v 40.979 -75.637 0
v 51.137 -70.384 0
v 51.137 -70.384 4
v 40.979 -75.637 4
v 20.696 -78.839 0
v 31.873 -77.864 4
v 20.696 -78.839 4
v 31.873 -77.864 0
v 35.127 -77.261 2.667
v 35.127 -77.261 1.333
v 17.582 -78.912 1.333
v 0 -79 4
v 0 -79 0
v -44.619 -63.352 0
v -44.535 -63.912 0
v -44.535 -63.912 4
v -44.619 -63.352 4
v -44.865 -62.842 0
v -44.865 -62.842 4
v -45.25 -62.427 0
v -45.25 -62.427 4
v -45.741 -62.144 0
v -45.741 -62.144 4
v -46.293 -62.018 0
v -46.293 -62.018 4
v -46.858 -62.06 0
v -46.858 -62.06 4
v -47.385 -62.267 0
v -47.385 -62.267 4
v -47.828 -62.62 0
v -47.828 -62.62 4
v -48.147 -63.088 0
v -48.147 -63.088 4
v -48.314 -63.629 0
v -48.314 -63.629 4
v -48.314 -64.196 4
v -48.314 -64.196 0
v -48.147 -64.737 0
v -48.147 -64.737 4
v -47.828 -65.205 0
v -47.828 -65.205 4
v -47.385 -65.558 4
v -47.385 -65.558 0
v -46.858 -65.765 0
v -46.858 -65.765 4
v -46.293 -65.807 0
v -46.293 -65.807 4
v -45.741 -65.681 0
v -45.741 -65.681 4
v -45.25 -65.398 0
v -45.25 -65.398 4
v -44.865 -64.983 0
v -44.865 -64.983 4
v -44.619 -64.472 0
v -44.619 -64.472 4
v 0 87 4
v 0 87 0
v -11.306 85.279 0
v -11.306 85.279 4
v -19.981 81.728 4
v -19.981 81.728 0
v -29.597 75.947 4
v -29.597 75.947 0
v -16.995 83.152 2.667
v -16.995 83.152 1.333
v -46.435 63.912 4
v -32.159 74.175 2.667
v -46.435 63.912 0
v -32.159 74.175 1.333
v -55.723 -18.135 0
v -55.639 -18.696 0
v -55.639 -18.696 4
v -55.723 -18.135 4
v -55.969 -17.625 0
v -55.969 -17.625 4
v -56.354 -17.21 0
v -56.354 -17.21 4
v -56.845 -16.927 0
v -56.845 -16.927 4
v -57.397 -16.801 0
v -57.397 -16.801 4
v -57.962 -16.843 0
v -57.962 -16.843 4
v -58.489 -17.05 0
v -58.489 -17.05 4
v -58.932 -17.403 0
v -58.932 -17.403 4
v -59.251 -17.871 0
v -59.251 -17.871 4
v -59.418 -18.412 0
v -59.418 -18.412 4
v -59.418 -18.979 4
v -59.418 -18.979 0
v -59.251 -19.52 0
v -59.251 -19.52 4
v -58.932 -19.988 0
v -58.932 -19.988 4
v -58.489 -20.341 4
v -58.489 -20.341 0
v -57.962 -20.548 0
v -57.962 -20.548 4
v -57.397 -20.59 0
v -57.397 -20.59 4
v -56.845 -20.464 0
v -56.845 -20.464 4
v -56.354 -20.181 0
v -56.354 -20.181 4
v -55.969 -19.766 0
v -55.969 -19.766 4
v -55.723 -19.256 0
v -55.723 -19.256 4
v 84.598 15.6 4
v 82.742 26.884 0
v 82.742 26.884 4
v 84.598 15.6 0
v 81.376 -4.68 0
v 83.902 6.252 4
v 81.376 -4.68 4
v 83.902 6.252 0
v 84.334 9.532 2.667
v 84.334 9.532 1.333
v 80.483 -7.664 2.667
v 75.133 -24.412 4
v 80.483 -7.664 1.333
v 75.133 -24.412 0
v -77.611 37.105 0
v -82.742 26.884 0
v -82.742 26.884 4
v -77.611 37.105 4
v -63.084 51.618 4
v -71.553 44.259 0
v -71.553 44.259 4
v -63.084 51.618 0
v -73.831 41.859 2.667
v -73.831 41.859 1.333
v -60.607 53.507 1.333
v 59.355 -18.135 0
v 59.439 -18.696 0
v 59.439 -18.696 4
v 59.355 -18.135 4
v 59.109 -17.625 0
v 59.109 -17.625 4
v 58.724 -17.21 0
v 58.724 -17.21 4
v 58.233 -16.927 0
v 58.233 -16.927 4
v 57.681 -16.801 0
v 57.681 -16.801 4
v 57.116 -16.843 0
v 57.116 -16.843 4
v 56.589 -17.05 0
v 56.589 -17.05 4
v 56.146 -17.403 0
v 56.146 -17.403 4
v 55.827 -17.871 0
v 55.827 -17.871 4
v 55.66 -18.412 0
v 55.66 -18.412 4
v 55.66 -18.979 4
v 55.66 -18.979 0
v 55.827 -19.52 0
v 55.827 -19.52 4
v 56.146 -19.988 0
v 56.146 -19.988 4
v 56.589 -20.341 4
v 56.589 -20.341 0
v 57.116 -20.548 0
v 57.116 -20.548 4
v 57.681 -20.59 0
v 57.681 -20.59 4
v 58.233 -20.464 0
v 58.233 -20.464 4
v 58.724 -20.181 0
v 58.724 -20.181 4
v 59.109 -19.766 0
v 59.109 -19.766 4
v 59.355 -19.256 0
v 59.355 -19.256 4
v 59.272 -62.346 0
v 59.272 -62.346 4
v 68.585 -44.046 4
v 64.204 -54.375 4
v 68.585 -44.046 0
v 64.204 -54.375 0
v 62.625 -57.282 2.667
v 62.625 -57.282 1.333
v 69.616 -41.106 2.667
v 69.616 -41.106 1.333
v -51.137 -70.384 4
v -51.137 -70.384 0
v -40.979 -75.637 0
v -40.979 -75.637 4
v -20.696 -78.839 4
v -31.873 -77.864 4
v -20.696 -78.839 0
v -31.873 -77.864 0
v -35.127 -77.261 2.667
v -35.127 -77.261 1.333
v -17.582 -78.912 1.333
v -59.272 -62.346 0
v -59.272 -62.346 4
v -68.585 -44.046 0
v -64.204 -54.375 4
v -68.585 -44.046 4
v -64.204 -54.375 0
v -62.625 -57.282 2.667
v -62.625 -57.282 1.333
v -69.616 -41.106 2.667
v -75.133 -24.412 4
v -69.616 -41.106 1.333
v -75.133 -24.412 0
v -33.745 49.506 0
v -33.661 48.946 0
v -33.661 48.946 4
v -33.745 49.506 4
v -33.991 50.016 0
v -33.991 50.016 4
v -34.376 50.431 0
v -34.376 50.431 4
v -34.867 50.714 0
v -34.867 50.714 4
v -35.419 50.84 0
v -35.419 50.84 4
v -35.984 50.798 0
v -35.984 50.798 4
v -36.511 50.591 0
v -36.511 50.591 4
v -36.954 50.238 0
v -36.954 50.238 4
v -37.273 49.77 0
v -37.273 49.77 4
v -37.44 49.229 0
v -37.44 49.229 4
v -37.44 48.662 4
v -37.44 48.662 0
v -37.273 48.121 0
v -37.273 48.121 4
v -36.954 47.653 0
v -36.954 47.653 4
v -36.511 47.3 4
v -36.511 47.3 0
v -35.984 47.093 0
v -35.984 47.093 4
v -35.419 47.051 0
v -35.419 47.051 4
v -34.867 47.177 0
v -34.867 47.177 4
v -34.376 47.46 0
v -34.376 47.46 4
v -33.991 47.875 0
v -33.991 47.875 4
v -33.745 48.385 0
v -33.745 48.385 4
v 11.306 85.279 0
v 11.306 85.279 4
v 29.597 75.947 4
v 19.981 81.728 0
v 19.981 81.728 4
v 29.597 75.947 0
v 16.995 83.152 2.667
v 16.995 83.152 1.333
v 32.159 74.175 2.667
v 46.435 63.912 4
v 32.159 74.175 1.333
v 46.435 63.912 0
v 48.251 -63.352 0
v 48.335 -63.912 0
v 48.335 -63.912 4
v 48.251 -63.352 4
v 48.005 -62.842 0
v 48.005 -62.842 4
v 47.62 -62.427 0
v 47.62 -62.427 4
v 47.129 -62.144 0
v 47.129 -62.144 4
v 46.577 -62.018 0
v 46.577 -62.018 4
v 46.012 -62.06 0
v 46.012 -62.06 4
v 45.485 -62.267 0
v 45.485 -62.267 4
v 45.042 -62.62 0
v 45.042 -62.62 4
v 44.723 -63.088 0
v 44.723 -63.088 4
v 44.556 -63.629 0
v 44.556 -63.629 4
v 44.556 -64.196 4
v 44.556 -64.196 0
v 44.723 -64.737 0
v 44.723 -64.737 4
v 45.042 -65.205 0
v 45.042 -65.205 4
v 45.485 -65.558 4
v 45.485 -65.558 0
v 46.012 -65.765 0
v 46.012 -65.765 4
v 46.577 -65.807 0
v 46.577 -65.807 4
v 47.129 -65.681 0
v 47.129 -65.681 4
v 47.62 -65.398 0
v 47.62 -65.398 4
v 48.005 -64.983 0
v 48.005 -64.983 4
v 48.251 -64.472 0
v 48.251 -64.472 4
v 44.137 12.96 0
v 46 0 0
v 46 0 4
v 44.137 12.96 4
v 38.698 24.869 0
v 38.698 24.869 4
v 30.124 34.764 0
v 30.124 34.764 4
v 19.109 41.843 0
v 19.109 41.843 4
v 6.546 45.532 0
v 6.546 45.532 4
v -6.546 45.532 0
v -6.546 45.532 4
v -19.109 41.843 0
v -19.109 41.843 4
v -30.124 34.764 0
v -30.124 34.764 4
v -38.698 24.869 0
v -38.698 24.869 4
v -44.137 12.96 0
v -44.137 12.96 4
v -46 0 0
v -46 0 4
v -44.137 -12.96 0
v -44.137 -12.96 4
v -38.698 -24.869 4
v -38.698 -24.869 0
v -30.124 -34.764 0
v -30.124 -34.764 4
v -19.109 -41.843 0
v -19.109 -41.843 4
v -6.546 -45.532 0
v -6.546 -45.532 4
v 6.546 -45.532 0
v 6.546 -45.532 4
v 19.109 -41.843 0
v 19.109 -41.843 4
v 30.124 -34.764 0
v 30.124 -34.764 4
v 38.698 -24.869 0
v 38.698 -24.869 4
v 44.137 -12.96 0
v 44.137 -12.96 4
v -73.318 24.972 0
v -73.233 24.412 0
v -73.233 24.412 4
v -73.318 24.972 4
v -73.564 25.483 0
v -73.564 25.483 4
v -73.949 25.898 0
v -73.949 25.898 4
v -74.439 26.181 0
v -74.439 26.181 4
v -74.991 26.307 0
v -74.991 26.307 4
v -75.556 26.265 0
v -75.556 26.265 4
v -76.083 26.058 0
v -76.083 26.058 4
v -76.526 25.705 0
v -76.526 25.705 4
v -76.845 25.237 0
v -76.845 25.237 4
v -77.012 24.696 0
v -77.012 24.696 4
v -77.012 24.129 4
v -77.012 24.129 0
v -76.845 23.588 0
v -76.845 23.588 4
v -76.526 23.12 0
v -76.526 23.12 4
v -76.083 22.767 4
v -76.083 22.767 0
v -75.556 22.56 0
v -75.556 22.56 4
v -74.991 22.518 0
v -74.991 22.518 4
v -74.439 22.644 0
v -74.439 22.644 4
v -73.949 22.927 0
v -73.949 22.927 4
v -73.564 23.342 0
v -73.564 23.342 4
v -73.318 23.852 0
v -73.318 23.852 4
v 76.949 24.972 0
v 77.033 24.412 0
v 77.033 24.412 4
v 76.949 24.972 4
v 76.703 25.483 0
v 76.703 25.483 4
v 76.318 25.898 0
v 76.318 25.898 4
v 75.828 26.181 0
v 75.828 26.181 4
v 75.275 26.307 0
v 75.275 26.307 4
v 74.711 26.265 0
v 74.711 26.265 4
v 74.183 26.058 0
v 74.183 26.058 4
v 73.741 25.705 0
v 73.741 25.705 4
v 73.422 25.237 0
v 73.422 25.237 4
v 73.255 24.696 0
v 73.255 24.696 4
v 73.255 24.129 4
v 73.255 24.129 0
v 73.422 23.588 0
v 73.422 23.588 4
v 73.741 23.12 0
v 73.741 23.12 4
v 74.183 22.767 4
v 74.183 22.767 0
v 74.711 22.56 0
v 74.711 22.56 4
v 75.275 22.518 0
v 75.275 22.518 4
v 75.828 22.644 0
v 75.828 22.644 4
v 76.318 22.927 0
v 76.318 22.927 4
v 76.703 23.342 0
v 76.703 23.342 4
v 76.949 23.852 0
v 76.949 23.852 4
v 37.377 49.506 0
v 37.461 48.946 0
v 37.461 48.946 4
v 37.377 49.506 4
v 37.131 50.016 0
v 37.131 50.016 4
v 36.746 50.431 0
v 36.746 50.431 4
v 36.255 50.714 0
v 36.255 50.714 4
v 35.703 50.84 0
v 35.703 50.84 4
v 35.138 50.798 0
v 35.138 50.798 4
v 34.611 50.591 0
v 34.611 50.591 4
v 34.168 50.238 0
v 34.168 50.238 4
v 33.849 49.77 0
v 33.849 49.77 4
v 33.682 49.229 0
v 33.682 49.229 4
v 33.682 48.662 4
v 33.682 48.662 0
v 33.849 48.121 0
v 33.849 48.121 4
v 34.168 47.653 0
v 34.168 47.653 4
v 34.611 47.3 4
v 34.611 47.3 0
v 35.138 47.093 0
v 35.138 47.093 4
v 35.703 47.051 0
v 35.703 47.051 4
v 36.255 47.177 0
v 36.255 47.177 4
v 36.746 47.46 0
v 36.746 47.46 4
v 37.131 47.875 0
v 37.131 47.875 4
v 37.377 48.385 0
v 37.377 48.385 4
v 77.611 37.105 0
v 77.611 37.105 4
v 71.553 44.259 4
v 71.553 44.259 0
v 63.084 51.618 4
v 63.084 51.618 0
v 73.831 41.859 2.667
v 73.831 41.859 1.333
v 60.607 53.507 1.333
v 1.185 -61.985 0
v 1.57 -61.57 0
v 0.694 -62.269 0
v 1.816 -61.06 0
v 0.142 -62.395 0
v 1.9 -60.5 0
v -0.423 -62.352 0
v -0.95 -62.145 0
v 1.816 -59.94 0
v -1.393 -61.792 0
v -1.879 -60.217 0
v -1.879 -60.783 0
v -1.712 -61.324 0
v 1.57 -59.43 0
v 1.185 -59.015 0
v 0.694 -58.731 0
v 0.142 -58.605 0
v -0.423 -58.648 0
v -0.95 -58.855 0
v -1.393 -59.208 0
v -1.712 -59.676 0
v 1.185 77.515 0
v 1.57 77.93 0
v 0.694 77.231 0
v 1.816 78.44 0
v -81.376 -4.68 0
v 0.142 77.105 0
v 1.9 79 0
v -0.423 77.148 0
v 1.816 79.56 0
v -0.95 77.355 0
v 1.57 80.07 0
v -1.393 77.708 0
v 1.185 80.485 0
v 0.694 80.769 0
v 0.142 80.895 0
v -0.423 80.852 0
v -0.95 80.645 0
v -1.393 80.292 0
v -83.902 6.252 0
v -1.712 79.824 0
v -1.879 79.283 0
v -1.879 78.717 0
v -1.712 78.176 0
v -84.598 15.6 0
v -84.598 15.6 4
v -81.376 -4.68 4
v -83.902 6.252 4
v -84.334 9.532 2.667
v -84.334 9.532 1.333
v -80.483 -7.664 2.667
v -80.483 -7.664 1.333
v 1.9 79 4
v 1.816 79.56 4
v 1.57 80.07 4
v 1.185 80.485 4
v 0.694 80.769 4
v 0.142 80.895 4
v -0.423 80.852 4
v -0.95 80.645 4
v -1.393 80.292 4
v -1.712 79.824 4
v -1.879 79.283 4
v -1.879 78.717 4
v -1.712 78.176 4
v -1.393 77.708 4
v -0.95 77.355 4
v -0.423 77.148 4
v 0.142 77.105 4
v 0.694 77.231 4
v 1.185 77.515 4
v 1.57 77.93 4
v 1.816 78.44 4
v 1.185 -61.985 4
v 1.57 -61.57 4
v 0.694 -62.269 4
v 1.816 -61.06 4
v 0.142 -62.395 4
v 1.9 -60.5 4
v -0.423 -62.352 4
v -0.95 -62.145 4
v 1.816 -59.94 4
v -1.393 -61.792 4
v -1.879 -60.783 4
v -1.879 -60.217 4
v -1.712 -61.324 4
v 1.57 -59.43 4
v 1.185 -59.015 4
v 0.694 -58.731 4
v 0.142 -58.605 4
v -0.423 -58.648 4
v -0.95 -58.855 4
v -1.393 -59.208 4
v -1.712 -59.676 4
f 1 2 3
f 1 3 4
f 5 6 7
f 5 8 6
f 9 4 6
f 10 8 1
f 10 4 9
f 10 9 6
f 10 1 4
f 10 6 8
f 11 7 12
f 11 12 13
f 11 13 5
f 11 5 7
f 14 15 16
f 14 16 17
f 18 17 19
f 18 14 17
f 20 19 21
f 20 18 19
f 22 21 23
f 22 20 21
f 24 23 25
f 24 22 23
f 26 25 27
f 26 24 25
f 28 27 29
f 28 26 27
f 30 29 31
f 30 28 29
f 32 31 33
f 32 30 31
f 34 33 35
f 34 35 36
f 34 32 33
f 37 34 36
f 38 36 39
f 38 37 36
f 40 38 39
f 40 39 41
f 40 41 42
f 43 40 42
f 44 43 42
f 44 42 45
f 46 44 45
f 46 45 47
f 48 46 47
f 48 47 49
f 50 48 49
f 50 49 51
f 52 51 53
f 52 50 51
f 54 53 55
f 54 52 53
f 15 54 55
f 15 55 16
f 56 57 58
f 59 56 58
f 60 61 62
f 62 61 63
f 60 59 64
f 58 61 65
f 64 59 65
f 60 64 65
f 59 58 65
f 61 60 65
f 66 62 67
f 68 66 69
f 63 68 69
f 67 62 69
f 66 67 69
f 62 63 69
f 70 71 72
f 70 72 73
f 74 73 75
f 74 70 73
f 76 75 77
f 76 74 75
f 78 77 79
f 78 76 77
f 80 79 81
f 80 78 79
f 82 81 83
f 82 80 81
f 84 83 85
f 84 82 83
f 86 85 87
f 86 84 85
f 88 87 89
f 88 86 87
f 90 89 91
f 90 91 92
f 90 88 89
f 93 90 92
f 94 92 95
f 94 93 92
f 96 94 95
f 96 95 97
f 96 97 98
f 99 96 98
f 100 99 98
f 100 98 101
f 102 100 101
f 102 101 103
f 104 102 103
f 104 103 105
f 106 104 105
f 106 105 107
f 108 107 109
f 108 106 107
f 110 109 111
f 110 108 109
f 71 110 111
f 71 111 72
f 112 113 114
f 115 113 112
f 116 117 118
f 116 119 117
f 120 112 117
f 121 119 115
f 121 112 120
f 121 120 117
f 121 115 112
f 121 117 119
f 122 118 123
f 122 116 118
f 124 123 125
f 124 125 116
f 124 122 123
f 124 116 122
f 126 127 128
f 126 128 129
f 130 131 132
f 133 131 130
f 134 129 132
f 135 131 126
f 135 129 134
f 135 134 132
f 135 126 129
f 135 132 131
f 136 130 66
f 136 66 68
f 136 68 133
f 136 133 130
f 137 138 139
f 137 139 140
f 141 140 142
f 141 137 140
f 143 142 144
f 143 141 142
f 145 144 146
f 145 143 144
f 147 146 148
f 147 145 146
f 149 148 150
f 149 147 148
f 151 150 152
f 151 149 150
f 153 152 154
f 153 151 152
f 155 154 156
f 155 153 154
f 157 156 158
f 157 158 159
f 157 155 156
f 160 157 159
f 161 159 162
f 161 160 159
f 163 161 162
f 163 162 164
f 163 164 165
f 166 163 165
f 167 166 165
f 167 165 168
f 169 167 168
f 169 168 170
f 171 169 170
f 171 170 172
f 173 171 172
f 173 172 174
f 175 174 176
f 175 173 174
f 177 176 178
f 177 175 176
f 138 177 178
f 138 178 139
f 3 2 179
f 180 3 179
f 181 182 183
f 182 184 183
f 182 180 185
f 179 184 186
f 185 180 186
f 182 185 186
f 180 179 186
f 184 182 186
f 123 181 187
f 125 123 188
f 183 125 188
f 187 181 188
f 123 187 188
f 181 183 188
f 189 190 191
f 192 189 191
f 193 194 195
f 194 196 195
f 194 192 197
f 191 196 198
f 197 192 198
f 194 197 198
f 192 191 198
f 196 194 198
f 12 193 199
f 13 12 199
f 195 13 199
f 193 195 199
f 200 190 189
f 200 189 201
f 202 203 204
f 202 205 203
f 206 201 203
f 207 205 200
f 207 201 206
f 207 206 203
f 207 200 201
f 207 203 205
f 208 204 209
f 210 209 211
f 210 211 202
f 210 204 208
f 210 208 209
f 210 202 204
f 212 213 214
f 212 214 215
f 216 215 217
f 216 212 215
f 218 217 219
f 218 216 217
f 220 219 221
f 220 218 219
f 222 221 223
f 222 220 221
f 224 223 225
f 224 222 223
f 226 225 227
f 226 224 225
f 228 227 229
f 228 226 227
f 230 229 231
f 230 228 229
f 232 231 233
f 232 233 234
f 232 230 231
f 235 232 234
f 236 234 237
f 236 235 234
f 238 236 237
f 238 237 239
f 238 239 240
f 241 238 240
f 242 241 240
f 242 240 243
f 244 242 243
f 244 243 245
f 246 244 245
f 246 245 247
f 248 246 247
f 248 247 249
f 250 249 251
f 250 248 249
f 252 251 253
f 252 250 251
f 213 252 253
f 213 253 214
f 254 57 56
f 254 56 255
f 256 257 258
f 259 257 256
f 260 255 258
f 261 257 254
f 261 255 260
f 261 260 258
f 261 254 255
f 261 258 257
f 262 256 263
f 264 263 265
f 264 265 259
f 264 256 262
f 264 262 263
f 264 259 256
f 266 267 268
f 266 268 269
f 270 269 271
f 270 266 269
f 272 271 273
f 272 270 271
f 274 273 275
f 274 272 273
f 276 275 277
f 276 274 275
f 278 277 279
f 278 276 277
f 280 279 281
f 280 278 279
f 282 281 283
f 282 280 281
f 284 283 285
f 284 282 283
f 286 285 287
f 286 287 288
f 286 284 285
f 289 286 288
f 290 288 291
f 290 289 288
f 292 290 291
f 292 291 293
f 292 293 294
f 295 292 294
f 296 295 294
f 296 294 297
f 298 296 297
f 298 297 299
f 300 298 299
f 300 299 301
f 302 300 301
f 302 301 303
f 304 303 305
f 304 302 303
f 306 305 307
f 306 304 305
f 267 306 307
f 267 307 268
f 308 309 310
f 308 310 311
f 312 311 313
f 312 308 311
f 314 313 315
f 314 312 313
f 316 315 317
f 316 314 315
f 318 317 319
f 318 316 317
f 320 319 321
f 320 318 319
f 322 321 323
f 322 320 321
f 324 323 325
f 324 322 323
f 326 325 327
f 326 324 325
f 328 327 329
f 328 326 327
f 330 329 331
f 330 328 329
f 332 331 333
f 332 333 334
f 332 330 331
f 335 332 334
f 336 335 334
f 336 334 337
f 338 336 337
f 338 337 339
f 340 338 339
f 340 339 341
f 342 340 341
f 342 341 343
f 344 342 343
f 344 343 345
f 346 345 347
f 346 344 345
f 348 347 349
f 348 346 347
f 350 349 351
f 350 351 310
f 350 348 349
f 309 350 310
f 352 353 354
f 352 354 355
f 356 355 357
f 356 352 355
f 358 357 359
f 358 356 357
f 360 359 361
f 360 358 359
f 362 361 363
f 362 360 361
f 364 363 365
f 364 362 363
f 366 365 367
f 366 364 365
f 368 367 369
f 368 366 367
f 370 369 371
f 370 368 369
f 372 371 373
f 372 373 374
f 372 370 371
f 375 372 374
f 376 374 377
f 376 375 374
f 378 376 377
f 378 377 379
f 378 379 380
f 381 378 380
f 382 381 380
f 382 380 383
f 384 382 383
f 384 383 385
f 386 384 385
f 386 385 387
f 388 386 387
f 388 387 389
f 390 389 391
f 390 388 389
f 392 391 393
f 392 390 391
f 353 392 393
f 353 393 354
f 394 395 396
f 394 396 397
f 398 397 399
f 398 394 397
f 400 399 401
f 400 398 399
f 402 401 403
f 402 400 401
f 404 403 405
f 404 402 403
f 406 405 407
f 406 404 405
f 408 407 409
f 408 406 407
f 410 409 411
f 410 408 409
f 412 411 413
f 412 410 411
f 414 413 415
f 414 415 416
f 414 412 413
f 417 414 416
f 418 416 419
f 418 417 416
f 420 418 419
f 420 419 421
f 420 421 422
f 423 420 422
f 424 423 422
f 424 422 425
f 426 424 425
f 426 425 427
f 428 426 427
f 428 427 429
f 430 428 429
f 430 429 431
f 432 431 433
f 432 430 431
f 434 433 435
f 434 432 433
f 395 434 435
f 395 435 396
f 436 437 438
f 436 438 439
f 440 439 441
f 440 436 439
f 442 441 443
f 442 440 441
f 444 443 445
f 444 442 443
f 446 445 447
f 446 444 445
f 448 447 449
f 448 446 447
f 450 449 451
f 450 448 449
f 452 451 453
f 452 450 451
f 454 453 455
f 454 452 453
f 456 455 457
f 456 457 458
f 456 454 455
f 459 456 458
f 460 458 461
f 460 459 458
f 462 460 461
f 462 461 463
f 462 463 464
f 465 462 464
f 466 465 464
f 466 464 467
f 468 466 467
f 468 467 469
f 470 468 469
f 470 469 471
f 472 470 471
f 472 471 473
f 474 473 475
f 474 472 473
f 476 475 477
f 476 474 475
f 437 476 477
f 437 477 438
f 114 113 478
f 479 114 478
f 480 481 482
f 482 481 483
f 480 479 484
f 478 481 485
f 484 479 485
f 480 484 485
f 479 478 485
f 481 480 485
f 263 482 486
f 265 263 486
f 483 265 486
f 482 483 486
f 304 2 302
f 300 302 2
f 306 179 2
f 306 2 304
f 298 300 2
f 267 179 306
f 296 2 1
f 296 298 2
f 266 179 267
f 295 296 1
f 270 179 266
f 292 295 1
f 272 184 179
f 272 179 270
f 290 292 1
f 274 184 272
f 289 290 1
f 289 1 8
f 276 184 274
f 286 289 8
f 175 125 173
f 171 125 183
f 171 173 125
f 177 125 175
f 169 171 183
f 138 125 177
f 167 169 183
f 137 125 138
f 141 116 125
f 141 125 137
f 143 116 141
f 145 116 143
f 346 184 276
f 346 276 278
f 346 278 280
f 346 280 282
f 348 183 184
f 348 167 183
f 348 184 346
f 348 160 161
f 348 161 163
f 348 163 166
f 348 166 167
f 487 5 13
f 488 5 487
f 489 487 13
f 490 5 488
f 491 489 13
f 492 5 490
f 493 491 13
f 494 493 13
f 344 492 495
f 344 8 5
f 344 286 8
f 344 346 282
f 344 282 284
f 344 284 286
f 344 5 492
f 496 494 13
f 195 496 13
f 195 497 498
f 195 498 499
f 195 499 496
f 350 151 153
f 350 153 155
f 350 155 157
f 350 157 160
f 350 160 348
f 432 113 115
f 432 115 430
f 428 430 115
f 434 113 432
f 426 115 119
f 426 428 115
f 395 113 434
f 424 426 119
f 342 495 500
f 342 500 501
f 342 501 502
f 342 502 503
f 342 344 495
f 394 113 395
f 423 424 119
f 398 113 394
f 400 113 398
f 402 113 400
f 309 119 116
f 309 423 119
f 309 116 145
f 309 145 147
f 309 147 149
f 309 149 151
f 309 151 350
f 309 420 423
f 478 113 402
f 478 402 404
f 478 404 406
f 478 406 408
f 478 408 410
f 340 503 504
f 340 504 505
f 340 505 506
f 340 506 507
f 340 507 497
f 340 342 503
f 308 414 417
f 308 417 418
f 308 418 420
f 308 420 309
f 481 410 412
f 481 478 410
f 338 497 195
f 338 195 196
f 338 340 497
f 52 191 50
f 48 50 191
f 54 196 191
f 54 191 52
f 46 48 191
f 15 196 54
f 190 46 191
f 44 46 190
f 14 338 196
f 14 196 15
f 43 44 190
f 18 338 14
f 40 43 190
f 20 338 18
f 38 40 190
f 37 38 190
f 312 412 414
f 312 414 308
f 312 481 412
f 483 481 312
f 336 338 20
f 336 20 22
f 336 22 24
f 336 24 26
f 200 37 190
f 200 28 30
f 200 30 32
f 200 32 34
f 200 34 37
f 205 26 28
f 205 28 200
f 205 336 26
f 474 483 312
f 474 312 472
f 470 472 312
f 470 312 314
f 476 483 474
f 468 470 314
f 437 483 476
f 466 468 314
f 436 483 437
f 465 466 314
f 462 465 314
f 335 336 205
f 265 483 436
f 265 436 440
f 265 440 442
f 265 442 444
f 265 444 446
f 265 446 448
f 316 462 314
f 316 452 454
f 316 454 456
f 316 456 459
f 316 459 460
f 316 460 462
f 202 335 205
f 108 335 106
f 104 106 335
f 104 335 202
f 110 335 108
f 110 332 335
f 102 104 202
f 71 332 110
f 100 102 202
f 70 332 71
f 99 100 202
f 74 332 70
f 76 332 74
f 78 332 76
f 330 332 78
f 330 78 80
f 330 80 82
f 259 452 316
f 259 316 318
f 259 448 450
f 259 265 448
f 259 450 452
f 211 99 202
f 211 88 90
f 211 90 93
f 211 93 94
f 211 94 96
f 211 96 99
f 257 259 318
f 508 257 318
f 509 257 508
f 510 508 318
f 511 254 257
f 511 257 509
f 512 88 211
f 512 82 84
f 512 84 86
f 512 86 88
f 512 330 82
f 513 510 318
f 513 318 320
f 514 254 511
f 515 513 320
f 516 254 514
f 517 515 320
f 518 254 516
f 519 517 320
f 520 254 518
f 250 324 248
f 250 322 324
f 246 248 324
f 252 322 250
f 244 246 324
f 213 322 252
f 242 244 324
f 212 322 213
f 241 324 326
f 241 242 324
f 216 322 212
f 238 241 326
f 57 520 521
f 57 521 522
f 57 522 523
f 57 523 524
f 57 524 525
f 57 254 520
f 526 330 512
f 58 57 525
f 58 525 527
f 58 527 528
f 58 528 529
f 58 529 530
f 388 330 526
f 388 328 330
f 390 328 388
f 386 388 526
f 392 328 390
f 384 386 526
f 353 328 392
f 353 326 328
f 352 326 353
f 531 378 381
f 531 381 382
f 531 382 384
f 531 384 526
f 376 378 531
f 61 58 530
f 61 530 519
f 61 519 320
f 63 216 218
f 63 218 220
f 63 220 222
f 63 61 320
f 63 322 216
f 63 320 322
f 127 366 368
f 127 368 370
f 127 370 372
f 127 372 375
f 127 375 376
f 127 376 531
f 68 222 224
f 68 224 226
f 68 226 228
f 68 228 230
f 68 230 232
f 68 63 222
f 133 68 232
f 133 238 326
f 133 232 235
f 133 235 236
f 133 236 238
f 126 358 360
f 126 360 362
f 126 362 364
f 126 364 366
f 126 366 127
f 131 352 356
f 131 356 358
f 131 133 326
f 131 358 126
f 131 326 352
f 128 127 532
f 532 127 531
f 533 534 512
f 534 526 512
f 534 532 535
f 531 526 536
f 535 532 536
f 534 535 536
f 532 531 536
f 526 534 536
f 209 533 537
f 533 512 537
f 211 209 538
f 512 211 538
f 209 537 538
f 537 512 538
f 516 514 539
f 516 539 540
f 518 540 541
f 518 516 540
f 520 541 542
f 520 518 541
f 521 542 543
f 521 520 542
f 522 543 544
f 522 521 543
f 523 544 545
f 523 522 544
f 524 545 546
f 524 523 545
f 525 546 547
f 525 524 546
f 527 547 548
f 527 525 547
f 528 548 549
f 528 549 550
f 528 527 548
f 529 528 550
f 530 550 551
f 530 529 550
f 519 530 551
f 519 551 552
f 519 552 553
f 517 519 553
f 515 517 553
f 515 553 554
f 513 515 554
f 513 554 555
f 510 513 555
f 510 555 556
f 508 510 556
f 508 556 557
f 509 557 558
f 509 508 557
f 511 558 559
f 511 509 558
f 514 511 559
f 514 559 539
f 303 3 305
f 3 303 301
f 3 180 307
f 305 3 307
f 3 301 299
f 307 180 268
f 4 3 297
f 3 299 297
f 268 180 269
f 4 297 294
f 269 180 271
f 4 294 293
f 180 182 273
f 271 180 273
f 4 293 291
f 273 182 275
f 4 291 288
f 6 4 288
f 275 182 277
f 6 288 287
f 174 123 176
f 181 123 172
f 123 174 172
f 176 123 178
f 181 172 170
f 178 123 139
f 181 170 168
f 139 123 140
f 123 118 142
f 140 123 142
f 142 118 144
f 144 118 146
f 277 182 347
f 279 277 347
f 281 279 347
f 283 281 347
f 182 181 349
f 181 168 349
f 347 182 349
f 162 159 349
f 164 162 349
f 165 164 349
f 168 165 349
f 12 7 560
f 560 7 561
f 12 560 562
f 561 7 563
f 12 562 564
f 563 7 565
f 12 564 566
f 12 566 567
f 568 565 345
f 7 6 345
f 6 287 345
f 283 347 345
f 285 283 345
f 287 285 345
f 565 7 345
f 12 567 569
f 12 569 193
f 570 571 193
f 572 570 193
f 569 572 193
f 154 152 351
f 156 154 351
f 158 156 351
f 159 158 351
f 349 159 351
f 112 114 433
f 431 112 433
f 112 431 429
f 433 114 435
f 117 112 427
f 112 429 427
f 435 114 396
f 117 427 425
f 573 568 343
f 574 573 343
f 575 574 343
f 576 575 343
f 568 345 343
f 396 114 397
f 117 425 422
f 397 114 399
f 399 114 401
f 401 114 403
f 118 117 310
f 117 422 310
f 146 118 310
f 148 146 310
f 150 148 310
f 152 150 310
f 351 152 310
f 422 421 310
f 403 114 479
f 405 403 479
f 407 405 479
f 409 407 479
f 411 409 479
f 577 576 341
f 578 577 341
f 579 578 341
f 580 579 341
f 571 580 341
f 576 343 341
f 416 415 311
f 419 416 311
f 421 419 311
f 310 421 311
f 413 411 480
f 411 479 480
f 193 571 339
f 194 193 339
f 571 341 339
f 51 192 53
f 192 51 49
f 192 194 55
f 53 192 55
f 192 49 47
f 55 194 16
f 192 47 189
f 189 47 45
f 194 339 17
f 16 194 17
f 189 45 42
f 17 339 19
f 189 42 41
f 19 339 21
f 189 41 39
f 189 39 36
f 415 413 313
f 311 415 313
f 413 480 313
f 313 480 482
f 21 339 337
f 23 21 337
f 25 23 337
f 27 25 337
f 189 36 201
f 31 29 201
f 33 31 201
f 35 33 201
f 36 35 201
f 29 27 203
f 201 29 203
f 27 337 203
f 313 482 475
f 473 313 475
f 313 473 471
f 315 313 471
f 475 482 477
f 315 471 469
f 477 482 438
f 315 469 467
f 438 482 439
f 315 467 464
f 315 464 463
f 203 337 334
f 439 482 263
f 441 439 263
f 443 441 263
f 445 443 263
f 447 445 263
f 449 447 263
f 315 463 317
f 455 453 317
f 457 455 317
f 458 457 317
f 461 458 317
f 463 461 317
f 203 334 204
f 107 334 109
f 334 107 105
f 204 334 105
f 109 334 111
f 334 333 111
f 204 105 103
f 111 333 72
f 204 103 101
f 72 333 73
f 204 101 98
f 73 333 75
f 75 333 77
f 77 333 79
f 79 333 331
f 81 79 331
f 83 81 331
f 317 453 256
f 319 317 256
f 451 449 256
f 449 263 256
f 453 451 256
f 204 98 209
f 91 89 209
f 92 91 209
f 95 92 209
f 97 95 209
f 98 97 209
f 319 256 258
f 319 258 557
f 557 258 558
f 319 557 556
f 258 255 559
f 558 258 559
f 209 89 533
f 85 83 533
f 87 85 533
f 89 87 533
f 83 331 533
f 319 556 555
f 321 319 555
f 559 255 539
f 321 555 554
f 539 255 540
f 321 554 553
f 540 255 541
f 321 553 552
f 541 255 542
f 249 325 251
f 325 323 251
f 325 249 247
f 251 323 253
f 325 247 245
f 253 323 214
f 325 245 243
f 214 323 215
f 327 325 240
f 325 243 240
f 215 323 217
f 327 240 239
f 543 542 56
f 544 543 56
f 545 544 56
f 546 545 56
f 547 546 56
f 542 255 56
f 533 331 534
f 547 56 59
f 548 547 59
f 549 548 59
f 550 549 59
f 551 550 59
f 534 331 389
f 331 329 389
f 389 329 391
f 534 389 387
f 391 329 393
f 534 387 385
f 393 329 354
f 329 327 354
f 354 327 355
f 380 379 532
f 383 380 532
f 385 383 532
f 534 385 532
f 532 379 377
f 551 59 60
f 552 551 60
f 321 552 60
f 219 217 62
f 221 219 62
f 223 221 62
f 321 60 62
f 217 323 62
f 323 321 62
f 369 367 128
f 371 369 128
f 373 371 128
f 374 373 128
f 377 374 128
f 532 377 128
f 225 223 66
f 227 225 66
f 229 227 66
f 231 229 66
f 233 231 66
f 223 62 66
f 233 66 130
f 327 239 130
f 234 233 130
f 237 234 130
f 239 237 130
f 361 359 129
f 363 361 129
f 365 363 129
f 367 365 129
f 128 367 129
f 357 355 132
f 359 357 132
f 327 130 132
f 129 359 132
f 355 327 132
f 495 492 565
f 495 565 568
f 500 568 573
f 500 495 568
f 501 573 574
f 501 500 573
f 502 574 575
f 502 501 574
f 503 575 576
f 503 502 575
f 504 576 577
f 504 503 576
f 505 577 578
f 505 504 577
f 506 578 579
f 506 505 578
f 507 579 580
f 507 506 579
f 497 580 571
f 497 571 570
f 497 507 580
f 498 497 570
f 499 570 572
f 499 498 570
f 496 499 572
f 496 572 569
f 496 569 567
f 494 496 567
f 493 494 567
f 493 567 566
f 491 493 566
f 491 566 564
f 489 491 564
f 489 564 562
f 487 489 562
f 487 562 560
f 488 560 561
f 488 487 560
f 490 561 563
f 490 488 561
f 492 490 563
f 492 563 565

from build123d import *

# Parameters (mm, degrees)
SZKIC1_R                    = 1.9
SZKIC1_R_2                  = 46
DODANIE_WYCI_GNI_CIE1_DEPTH = 4


with BuildPart() as part:
    # Szkic1 → Dodanie-wyciągnięcie1 (new body)
    with BuildSketch(Plane.XY):
        with BuildLine():
            add(Edge.make_bspline(
                [(0, 87), (18.224844976, 86.998612649), (32.288902875, 73.536902698), (46.435034931, 63.912342556)],
                knots=[0, 0, 0, 0, 1, 1, 1, 1], degree=3))
            add(Edge.make_bspline(
                [(82.741916918, 26.884478511), (77.108810651, 44.216907368), (59.959930782, 53.43272413), (46.435034931, 63.912342556)],
                knots=[0, 0, 0, 0, 1, 1, 1, 1], degree=3))
            add(Edge.make_bspline(
                [(82.741916918, 26.884478511), (88.372384286, 9.551192223), (79.915570217, -7.984418835), (75.133464787, -24.412342556)],
                knots=[0, 0, 0, 0, 1, 1, 1, 1], degree=3))
            add(Edge.make_bspline(
                [(51.137316949, -70.384478511), (65.88071079, -59.671061018), (69.346178061, -40.513663074), (75.133464787, -24.412342556)],
                knots=[0, 0, 0, 0, 1, 1, 1, 1], degree=3))
            add(Edge.make_bspline(
                [(51.137316949, -70.384478511), (36.39229218, -81.095651222), (17.10163575, -78.471544919), (0, -79)],
                knots=[0, 0, 0, 0, 1, 1, 1, 1], degree=3))
            add(Edge.make_bspline(
                [(-51.137316949, -70.384478511), (-36.39229218, -81.095651222), (-17.10163575, -78.471544919), (0, -79)],
                knots=[0, 0, 0, 0, 1, 1, 1, 1], degree=3))
            add(Edge.make_bspline(
                [(-51.137316949, -70.384478511), (-65.88071079, -59.671061018), (-69.346178061, -40.513663074), (-75.133464787, -24.412342556)],
                knots=[0, 0, 0, 0, 1, 1, 1, 1], degree=3))
            add(Edge.make_bspline(
                [(-82.741916918, 26.884478511), (-88.372384286, 9.551192223), (-79.915570217, -7.984418835), (-75.133464787, -24.412342556)],
                knots=[0, 0, 0, 0, 1, 1, 1, 1], degree=3))
            add(Edge.make_bspline(
                [(-82.741916918, 26.884478511), (-77.108810651, 44.216907368), (-59.959930782, 53.43272413), (-46.435034931, 63.912342556)],
                knots=[0, 0, 0, 0, 1, 1, 1, 1], degree=3))
            add(Edge.make_bspline(
                [(0, 87), (-18.224844976, 86.998612649), (-32.288902875, 73.536902698), (-46.435034931, 63.912342556)],
                knots=[0, 0, 0, 0, 1, 1, 1, 1], degree=3))
        make_face()
        with Locations((0, 79)):
            Circle(SZKIC1_R, mode=Mode.SUBTRACT)
        with Locations((75.133464787, 24.412342556)):
            Circle(SZKIC1_R, mode=Mode.SUBTRACT)
        with Locations((46.435034931, -63.912342556)):
            Circle(SZKIC1_R, mode=Mode.SUBTRACT)
        with Locations((-46.435034931, -63.912342556)):
            Circle(SZKIC1_R, mode=Mode.SUBTRACT)
        with Locations((-75.133464787, 24.412342556)):
            Circle(SZKIC1_R, mode=Mode.SUBTRACT)
        Circle(SZKIC1_R_2, mode=Mode.SUBTRACT)
        with Locations((35.561007764, 48.94552816)):
            Circle(SZKIC1_R, mode=Mode.SUBTRACT)
        with Locations((57.538919236, -18.69552816)):
            Circle(SZKIC1_R, mode=Mode.SUBTRACT)
        with Locations((0, -60.5)):
            Circle(SZKIC1_R, mode=Mode.SUBTRACT)
        with Locations((-57.538919236, -18.69552816)):
            Circle(SZKIC1_R, mode=Mode.SUBTRACT)
        with Locations((-35.561007764, 48.94552816)):
            Circle(SZKIC1_R, mode=Mode.SUBTRACT)
    extrude(amount=DODANIE_WYCI_GNI_CIE1_DEPTH)


solid = part.part
